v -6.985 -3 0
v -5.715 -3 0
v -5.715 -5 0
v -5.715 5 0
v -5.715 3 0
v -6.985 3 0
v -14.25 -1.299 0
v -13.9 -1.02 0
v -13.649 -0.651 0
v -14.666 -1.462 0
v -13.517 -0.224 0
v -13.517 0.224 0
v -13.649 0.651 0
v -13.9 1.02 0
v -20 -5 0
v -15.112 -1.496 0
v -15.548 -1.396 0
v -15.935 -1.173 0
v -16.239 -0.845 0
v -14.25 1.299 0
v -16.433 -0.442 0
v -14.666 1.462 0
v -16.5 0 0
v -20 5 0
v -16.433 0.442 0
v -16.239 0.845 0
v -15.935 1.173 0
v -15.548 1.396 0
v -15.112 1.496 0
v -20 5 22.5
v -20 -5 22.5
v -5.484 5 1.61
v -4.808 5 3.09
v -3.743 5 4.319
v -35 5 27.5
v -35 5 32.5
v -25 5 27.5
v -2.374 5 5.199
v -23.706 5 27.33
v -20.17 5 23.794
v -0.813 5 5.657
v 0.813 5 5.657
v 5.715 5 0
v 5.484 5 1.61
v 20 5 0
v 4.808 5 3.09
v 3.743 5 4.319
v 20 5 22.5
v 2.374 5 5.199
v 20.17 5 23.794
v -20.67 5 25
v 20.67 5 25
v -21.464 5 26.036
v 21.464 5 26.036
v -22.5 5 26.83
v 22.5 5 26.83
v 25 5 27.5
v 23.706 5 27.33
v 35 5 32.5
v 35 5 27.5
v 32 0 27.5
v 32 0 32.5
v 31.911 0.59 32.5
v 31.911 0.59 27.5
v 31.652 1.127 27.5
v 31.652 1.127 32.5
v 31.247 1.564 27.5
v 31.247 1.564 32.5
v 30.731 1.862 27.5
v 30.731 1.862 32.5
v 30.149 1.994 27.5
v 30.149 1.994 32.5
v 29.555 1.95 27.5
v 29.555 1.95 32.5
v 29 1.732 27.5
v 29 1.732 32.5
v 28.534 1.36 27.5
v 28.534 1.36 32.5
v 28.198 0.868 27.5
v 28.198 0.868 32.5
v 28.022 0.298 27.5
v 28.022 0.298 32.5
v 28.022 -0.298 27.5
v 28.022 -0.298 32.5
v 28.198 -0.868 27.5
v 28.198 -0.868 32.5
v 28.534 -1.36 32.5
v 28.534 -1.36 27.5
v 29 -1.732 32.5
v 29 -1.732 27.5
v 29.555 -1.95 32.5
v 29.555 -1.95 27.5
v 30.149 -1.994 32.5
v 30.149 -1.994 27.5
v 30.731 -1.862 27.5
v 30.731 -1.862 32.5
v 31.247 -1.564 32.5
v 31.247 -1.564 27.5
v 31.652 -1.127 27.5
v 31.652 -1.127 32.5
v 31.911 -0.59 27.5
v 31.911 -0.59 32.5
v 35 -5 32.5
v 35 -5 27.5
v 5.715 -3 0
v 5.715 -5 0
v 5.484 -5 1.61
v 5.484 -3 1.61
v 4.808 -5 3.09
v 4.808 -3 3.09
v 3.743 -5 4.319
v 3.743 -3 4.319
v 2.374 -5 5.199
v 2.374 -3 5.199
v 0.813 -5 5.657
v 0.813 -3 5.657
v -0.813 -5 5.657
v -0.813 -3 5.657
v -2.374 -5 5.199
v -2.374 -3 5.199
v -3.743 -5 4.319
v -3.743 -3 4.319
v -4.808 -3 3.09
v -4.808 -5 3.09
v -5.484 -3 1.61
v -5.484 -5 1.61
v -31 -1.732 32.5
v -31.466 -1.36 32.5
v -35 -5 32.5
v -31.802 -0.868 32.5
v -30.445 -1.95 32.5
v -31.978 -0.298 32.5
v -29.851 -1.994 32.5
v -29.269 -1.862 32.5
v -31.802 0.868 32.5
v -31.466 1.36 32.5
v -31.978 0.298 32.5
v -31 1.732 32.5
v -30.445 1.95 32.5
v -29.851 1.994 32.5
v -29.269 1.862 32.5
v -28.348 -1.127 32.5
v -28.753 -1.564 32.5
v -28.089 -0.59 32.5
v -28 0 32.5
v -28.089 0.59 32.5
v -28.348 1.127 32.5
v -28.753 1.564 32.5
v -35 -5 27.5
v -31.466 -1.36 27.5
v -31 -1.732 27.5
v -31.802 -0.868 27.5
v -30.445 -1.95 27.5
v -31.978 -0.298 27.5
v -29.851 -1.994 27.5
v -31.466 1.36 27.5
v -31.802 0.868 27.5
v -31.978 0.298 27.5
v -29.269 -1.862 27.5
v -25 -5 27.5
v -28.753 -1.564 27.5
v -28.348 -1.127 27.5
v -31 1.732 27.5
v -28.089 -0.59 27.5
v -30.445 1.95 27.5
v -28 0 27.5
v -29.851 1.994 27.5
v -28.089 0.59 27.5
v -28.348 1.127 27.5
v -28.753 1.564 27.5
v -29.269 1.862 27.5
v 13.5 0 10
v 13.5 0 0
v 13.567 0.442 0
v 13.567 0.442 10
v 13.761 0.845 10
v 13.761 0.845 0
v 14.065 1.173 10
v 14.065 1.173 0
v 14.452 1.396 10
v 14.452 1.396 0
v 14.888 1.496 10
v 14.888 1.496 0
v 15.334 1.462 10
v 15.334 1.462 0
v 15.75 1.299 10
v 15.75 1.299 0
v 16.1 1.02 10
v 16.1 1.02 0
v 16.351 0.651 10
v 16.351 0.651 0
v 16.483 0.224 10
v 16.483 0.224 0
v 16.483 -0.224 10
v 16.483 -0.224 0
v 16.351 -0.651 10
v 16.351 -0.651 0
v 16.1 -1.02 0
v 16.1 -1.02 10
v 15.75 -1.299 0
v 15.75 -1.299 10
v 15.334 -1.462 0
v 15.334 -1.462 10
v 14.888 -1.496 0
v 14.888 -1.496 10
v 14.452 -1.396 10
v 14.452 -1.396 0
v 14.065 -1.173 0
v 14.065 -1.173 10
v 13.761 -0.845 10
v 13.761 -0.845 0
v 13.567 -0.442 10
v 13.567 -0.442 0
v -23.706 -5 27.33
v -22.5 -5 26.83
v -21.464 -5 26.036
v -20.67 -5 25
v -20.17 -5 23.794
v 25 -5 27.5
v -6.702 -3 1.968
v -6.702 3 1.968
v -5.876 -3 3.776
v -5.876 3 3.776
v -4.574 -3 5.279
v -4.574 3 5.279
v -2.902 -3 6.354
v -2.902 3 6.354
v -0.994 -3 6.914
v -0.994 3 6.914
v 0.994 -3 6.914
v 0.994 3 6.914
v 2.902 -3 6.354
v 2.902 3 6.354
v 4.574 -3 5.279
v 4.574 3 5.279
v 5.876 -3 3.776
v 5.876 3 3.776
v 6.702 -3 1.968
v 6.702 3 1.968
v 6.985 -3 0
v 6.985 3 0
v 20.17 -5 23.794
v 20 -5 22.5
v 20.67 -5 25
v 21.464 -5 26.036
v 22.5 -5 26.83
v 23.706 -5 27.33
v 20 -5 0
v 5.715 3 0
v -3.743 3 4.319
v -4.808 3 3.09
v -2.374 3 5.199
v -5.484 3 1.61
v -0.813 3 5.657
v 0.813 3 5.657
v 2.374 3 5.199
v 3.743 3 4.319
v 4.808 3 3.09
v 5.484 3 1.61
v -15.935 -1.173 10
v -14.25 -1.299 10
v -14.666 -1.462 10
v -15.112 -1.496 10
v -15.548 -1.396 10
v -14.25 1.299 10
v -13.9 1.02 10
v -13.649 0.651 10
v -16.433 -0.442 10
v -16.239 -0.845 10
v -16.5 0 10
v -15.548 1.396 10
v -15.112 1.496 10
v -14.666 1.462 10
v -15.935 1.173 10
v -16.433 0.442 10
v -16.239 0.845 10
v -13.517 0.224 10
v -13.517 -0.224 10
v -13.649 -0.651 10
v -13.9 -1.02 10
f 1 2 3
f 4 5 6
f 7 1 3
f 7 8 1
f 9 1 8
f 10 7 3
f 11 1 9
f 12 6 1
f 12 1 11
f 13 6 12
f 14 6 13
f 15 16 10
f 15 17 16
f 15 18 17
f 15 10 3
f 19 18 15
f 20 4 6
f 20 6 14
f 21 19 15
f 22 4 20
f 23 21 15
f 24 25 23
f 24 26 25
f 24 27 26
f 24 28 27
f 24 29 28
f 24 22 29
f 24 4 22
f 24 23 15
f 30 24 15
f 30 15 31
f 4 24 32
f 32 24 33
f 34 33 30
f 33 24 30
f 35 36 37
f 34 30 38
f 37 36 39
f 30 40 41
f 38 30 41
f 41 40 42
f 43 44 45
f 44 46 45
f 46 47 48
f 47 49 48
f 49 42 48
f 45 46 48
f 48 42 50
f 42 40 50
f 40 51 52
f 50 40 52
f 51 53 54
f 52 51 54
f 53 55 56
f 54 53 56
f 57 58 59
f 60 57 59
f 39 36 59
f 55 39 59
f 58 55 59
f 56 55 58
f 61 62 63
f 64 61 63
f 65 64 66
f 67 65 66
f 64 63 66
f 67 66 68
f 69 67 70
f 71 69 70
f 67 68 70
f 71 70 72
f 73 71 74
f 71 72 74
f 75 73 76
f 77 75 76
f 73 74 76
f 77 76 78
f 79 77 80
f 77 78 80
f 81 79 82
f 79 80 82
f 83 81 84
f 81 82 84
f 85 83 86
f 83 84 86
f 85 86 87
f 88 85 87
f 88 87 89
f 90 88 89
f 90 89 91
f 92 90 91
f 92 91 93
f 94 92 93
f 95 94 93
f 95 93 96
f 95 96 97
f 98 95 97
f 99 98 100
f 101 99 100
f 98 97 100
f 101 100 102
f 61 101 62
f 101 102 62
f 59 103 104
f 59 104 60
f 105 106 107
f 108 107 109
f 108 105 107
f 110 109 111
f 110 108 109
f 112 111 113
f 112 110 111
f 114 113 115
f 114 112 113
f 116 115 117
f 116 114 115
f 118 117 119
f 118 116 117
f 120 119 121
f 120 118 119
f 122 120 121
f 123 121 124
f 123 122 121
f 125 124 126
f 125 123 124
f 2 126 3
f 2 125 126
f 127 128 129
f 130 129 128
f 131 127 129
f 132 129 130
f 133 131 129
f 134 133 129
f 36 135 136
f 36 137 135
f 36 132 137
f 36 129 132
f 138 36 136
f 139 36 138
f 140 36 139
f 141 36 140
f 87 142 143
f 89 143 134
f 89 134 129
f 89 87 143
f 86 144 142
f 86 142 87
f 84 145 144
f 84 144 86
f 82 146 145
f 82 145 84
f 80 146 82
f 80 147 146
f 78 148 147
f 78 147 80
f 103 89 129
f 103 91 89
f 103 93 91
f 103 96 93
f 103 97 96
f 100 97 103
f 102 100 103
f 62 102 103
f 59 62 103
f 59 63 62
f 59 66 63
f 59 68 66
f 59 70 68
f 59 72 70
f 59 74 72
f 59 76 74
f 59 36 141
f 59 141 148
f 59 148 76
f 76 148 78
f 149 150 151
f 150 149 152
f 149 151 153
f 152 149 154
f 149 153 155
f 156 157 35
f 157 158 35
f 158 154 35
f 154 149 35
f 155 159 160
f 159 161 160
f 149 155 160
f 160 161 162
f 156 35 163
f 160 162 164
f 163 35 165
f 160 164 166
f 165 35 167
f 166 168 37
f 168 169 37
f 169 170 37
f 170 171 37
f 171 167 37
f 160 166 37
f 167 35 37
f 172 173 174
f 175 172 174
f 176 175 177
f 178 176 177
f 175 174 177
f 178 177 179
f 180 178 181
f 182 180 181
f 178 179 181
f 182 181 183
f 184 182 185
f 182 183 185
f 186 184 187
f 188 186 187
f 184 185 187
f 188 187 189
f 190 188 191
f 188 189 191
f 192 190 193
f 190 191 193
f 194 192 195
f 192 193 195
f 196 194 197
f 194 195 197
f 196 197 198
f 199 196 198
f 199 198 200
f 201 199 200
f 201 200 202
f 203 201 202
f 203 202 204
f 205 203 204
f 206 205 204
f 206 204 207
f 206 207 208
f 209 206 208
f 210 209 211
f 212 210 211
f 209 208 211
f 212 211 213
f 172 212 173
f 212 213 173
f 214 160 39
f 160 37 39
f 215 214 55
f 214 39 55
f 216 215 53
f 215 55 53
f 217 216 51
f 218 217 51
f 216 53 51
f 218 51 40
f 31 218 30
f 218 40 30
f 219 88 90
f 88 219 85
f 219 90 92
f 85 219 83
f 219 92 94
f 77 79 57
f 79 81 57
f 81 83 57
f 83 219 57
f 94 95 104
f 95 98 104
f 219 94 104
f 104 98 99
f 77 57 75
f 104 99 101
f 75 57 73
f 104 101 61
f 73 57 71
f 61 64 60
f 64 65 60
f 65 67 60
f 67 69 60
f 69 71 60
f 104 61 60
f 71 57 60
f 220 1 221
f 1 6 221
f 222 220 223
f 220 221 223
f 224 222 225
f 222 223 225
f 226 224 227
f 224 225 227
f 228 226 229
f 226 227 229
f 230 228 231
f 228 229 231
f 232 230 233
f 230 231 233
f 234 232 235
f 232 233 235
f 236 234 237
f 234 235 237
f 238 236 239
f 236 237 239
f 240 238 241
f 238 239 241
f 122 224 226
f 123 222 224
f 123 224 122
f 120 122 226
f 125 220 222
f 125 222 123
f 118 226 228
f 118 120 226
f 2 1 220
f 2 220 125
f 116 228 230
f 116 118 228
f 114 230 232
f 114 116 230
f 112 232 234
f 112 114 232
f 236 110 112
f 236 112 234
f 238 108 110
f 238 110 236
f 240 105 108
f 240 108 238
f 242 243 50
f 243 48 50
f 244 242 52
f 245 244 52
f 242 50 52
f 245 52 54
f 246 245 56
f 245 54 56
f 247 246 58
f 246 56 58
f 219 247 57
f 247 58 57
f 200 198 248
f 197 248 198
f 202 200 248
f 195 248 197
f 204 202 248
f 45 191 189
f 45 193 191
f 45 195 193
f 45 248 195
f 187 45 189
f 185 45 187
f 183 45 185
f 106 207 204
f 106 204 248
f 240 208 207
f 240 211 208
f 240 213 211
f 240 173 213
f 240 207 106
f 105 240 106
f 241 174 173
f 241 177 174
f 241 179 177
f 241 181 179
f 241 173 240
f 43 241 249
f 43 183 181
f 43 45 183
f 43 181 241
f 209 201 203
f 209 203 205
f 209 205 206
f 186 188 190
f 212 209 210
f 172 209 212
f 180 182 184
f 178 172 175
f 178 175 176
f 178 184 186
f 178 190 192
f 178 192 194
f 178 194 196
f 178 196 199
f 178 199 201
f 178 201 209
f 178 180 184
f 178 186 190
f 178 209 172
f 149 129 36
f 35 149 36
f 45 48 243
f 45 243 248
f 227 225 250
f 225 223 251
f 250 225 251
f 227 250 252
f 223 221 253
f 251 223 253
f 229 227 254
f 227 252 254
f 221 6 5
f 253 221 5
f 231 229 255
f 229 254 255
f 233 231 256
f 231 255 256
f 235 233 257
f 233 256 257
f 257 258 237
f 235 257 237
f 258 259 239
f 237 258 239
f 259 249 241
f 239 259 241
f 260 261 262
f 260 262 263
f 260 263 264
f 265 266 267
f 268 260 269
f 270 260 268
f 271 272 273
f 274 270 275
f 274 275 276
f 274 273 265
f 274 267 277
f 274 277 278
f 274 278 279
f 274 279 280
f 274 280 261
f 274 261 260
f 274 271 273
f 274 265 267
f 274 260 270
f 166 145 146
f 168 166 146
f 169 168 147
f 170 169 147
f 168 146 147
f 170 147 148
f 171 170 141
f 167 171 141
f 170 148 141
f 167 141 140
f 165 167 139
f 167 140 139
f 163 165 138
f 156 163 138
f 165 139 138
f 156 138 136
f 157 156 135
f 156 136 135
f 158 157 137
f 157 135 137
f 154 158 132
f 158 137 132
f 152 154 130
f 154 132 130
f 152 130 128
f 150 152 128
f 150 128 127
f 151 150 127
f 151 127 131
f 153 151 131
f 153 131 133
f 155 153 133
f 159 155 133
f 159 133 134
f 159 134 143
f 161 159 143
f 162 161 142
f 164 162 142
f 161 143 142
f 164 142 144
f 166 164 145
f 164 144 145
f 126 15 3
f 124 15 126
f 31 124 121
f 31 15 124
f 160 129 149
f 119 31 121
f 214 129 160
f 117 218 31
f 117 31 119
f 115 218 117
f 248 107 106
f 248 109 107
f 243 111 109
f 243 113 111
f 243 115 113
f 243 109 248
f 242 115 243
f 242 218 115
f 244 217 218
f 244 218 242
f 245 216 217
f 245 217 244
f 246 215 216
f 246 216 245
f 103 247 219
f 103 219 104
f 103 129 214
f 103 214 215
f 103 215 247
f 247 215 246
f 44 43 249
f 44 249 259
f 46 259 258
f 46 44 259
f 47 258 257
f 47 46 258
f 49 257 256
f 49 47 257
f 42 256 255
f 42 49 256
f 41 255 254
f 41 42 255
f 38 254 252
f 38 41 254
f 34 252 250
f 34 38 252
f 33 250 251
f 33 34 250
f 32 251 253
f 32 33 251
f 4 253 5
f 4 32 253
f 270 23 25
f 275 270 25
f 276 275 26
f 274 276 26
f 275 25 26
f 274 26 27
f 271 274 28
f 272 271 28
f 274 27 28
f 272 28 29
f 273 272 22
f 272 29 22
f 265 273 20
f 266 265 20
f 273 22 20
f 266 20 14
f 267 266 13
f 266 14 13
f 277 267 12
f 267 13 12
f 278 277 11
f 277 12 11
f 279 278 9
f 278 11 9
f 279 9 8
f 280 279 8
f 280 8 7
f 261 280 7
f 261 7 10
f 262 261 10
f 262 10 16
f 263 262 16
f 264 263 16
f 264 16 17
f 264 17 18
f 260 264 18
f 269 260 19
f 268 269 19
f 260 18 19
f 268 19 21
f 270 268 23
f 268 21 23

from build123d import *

# Parameters (mm, degrees)
MAIN_BODY_DEPTH       = 5
SKETCH3_R             = 6.985
BEARING_CUTOUT_DEPTH  = 3
SKETCH4_R             = 1.5
TOP_MOUNT_HOLES_DEPTH = 10
SKETCH6_W             = 15
SKETCH6_H             = 10
SKETCH6_R             = 2
MOUNTING_HOLES_DEPTH  = 5
FILLET1_R             = 5


with BuildPart() as part:
    # Sketch1 → main body (new body, symmetric)
    with BuildSketch(Plane(origin=(0, 0, 0), x_dir=(1, 0, 0), z_dir=(0, 1, 0))):
        with BuildLine():
            Line((20, 0), (12.7, 0))
            Line((12.7, 0), (5.715, 0))
            ThreePointArc((5.715, 0), (0, -5.715), (-5.715, 0))
            Line((-5.715, 0), (-12.7, 0))
            Line((-12.7, 0), (-20, 0))
            Line((-20, 0), (-20, -32.5))
            Line((-20, -32.5), (20, -32.5))
            Line((20, -32.5), (20, 0))
        make_face()
    extrude(amount=MAIN_BODY_DEPTH, both=True)

    # Sketch3 → bearing cutout (cut, symmetric)
    with BuildSketch(Plane(origin=(0, 0, 0), x_dir=(1, 0, 0), z_dir=(0, 1, 0))):
        Circle(SKETCH3_R)
    extrude(amount=BEARING_CUTOUT_DEPTH, both=True, mode=Mode.SUBTRACT)

    # Sketch4 → top mount holes (cut)
    with BuildSketch(Plane(origin=(0, 0, 0), x_dir=(-1, 0, 0), z_dir=(0, 0, -1))):
        with Locations((-15, 0)):
            Circle(SKETCH4_R)
        with Locations((15, 0)):
            Circle(SKETCH4_R)
    extrude(amount=-TOP_MOUNT_HOLES_DEPTH, mode=Mode.SUBTRACT)

    # Sketch6 → mounting holes (add)
    with BuildSketch(Plane.XY.offset(32.5)):
        with Locations((-27.5, 0)):
            Rectangle(SKETCH6_W, SKETCH6_H)
        with Locations((-30, 0)):
            Circle(SKETCH6_R, mode=Mode.SUBTRACT)
        with Locations((27.5, 0)):
            Rectangle(SKETCH6_W, SKETCH6_H)
        with Locations((30, 0)):
            Circle(SKETCH6_R, mode=Mode.SUBTRACT)
    extrude(amount=-MOUNTING_HOLES_DEPTH)

    # Fillet1
    fillet1_edges = [part.edges().sort_by_distance(p)[0] for p in [
        (-20, 0, 27.5),
        (20, 0, 27.5),
    ]]
    fillet(fillet1_edges, radius=FILLET1_R)


solid = part.part
